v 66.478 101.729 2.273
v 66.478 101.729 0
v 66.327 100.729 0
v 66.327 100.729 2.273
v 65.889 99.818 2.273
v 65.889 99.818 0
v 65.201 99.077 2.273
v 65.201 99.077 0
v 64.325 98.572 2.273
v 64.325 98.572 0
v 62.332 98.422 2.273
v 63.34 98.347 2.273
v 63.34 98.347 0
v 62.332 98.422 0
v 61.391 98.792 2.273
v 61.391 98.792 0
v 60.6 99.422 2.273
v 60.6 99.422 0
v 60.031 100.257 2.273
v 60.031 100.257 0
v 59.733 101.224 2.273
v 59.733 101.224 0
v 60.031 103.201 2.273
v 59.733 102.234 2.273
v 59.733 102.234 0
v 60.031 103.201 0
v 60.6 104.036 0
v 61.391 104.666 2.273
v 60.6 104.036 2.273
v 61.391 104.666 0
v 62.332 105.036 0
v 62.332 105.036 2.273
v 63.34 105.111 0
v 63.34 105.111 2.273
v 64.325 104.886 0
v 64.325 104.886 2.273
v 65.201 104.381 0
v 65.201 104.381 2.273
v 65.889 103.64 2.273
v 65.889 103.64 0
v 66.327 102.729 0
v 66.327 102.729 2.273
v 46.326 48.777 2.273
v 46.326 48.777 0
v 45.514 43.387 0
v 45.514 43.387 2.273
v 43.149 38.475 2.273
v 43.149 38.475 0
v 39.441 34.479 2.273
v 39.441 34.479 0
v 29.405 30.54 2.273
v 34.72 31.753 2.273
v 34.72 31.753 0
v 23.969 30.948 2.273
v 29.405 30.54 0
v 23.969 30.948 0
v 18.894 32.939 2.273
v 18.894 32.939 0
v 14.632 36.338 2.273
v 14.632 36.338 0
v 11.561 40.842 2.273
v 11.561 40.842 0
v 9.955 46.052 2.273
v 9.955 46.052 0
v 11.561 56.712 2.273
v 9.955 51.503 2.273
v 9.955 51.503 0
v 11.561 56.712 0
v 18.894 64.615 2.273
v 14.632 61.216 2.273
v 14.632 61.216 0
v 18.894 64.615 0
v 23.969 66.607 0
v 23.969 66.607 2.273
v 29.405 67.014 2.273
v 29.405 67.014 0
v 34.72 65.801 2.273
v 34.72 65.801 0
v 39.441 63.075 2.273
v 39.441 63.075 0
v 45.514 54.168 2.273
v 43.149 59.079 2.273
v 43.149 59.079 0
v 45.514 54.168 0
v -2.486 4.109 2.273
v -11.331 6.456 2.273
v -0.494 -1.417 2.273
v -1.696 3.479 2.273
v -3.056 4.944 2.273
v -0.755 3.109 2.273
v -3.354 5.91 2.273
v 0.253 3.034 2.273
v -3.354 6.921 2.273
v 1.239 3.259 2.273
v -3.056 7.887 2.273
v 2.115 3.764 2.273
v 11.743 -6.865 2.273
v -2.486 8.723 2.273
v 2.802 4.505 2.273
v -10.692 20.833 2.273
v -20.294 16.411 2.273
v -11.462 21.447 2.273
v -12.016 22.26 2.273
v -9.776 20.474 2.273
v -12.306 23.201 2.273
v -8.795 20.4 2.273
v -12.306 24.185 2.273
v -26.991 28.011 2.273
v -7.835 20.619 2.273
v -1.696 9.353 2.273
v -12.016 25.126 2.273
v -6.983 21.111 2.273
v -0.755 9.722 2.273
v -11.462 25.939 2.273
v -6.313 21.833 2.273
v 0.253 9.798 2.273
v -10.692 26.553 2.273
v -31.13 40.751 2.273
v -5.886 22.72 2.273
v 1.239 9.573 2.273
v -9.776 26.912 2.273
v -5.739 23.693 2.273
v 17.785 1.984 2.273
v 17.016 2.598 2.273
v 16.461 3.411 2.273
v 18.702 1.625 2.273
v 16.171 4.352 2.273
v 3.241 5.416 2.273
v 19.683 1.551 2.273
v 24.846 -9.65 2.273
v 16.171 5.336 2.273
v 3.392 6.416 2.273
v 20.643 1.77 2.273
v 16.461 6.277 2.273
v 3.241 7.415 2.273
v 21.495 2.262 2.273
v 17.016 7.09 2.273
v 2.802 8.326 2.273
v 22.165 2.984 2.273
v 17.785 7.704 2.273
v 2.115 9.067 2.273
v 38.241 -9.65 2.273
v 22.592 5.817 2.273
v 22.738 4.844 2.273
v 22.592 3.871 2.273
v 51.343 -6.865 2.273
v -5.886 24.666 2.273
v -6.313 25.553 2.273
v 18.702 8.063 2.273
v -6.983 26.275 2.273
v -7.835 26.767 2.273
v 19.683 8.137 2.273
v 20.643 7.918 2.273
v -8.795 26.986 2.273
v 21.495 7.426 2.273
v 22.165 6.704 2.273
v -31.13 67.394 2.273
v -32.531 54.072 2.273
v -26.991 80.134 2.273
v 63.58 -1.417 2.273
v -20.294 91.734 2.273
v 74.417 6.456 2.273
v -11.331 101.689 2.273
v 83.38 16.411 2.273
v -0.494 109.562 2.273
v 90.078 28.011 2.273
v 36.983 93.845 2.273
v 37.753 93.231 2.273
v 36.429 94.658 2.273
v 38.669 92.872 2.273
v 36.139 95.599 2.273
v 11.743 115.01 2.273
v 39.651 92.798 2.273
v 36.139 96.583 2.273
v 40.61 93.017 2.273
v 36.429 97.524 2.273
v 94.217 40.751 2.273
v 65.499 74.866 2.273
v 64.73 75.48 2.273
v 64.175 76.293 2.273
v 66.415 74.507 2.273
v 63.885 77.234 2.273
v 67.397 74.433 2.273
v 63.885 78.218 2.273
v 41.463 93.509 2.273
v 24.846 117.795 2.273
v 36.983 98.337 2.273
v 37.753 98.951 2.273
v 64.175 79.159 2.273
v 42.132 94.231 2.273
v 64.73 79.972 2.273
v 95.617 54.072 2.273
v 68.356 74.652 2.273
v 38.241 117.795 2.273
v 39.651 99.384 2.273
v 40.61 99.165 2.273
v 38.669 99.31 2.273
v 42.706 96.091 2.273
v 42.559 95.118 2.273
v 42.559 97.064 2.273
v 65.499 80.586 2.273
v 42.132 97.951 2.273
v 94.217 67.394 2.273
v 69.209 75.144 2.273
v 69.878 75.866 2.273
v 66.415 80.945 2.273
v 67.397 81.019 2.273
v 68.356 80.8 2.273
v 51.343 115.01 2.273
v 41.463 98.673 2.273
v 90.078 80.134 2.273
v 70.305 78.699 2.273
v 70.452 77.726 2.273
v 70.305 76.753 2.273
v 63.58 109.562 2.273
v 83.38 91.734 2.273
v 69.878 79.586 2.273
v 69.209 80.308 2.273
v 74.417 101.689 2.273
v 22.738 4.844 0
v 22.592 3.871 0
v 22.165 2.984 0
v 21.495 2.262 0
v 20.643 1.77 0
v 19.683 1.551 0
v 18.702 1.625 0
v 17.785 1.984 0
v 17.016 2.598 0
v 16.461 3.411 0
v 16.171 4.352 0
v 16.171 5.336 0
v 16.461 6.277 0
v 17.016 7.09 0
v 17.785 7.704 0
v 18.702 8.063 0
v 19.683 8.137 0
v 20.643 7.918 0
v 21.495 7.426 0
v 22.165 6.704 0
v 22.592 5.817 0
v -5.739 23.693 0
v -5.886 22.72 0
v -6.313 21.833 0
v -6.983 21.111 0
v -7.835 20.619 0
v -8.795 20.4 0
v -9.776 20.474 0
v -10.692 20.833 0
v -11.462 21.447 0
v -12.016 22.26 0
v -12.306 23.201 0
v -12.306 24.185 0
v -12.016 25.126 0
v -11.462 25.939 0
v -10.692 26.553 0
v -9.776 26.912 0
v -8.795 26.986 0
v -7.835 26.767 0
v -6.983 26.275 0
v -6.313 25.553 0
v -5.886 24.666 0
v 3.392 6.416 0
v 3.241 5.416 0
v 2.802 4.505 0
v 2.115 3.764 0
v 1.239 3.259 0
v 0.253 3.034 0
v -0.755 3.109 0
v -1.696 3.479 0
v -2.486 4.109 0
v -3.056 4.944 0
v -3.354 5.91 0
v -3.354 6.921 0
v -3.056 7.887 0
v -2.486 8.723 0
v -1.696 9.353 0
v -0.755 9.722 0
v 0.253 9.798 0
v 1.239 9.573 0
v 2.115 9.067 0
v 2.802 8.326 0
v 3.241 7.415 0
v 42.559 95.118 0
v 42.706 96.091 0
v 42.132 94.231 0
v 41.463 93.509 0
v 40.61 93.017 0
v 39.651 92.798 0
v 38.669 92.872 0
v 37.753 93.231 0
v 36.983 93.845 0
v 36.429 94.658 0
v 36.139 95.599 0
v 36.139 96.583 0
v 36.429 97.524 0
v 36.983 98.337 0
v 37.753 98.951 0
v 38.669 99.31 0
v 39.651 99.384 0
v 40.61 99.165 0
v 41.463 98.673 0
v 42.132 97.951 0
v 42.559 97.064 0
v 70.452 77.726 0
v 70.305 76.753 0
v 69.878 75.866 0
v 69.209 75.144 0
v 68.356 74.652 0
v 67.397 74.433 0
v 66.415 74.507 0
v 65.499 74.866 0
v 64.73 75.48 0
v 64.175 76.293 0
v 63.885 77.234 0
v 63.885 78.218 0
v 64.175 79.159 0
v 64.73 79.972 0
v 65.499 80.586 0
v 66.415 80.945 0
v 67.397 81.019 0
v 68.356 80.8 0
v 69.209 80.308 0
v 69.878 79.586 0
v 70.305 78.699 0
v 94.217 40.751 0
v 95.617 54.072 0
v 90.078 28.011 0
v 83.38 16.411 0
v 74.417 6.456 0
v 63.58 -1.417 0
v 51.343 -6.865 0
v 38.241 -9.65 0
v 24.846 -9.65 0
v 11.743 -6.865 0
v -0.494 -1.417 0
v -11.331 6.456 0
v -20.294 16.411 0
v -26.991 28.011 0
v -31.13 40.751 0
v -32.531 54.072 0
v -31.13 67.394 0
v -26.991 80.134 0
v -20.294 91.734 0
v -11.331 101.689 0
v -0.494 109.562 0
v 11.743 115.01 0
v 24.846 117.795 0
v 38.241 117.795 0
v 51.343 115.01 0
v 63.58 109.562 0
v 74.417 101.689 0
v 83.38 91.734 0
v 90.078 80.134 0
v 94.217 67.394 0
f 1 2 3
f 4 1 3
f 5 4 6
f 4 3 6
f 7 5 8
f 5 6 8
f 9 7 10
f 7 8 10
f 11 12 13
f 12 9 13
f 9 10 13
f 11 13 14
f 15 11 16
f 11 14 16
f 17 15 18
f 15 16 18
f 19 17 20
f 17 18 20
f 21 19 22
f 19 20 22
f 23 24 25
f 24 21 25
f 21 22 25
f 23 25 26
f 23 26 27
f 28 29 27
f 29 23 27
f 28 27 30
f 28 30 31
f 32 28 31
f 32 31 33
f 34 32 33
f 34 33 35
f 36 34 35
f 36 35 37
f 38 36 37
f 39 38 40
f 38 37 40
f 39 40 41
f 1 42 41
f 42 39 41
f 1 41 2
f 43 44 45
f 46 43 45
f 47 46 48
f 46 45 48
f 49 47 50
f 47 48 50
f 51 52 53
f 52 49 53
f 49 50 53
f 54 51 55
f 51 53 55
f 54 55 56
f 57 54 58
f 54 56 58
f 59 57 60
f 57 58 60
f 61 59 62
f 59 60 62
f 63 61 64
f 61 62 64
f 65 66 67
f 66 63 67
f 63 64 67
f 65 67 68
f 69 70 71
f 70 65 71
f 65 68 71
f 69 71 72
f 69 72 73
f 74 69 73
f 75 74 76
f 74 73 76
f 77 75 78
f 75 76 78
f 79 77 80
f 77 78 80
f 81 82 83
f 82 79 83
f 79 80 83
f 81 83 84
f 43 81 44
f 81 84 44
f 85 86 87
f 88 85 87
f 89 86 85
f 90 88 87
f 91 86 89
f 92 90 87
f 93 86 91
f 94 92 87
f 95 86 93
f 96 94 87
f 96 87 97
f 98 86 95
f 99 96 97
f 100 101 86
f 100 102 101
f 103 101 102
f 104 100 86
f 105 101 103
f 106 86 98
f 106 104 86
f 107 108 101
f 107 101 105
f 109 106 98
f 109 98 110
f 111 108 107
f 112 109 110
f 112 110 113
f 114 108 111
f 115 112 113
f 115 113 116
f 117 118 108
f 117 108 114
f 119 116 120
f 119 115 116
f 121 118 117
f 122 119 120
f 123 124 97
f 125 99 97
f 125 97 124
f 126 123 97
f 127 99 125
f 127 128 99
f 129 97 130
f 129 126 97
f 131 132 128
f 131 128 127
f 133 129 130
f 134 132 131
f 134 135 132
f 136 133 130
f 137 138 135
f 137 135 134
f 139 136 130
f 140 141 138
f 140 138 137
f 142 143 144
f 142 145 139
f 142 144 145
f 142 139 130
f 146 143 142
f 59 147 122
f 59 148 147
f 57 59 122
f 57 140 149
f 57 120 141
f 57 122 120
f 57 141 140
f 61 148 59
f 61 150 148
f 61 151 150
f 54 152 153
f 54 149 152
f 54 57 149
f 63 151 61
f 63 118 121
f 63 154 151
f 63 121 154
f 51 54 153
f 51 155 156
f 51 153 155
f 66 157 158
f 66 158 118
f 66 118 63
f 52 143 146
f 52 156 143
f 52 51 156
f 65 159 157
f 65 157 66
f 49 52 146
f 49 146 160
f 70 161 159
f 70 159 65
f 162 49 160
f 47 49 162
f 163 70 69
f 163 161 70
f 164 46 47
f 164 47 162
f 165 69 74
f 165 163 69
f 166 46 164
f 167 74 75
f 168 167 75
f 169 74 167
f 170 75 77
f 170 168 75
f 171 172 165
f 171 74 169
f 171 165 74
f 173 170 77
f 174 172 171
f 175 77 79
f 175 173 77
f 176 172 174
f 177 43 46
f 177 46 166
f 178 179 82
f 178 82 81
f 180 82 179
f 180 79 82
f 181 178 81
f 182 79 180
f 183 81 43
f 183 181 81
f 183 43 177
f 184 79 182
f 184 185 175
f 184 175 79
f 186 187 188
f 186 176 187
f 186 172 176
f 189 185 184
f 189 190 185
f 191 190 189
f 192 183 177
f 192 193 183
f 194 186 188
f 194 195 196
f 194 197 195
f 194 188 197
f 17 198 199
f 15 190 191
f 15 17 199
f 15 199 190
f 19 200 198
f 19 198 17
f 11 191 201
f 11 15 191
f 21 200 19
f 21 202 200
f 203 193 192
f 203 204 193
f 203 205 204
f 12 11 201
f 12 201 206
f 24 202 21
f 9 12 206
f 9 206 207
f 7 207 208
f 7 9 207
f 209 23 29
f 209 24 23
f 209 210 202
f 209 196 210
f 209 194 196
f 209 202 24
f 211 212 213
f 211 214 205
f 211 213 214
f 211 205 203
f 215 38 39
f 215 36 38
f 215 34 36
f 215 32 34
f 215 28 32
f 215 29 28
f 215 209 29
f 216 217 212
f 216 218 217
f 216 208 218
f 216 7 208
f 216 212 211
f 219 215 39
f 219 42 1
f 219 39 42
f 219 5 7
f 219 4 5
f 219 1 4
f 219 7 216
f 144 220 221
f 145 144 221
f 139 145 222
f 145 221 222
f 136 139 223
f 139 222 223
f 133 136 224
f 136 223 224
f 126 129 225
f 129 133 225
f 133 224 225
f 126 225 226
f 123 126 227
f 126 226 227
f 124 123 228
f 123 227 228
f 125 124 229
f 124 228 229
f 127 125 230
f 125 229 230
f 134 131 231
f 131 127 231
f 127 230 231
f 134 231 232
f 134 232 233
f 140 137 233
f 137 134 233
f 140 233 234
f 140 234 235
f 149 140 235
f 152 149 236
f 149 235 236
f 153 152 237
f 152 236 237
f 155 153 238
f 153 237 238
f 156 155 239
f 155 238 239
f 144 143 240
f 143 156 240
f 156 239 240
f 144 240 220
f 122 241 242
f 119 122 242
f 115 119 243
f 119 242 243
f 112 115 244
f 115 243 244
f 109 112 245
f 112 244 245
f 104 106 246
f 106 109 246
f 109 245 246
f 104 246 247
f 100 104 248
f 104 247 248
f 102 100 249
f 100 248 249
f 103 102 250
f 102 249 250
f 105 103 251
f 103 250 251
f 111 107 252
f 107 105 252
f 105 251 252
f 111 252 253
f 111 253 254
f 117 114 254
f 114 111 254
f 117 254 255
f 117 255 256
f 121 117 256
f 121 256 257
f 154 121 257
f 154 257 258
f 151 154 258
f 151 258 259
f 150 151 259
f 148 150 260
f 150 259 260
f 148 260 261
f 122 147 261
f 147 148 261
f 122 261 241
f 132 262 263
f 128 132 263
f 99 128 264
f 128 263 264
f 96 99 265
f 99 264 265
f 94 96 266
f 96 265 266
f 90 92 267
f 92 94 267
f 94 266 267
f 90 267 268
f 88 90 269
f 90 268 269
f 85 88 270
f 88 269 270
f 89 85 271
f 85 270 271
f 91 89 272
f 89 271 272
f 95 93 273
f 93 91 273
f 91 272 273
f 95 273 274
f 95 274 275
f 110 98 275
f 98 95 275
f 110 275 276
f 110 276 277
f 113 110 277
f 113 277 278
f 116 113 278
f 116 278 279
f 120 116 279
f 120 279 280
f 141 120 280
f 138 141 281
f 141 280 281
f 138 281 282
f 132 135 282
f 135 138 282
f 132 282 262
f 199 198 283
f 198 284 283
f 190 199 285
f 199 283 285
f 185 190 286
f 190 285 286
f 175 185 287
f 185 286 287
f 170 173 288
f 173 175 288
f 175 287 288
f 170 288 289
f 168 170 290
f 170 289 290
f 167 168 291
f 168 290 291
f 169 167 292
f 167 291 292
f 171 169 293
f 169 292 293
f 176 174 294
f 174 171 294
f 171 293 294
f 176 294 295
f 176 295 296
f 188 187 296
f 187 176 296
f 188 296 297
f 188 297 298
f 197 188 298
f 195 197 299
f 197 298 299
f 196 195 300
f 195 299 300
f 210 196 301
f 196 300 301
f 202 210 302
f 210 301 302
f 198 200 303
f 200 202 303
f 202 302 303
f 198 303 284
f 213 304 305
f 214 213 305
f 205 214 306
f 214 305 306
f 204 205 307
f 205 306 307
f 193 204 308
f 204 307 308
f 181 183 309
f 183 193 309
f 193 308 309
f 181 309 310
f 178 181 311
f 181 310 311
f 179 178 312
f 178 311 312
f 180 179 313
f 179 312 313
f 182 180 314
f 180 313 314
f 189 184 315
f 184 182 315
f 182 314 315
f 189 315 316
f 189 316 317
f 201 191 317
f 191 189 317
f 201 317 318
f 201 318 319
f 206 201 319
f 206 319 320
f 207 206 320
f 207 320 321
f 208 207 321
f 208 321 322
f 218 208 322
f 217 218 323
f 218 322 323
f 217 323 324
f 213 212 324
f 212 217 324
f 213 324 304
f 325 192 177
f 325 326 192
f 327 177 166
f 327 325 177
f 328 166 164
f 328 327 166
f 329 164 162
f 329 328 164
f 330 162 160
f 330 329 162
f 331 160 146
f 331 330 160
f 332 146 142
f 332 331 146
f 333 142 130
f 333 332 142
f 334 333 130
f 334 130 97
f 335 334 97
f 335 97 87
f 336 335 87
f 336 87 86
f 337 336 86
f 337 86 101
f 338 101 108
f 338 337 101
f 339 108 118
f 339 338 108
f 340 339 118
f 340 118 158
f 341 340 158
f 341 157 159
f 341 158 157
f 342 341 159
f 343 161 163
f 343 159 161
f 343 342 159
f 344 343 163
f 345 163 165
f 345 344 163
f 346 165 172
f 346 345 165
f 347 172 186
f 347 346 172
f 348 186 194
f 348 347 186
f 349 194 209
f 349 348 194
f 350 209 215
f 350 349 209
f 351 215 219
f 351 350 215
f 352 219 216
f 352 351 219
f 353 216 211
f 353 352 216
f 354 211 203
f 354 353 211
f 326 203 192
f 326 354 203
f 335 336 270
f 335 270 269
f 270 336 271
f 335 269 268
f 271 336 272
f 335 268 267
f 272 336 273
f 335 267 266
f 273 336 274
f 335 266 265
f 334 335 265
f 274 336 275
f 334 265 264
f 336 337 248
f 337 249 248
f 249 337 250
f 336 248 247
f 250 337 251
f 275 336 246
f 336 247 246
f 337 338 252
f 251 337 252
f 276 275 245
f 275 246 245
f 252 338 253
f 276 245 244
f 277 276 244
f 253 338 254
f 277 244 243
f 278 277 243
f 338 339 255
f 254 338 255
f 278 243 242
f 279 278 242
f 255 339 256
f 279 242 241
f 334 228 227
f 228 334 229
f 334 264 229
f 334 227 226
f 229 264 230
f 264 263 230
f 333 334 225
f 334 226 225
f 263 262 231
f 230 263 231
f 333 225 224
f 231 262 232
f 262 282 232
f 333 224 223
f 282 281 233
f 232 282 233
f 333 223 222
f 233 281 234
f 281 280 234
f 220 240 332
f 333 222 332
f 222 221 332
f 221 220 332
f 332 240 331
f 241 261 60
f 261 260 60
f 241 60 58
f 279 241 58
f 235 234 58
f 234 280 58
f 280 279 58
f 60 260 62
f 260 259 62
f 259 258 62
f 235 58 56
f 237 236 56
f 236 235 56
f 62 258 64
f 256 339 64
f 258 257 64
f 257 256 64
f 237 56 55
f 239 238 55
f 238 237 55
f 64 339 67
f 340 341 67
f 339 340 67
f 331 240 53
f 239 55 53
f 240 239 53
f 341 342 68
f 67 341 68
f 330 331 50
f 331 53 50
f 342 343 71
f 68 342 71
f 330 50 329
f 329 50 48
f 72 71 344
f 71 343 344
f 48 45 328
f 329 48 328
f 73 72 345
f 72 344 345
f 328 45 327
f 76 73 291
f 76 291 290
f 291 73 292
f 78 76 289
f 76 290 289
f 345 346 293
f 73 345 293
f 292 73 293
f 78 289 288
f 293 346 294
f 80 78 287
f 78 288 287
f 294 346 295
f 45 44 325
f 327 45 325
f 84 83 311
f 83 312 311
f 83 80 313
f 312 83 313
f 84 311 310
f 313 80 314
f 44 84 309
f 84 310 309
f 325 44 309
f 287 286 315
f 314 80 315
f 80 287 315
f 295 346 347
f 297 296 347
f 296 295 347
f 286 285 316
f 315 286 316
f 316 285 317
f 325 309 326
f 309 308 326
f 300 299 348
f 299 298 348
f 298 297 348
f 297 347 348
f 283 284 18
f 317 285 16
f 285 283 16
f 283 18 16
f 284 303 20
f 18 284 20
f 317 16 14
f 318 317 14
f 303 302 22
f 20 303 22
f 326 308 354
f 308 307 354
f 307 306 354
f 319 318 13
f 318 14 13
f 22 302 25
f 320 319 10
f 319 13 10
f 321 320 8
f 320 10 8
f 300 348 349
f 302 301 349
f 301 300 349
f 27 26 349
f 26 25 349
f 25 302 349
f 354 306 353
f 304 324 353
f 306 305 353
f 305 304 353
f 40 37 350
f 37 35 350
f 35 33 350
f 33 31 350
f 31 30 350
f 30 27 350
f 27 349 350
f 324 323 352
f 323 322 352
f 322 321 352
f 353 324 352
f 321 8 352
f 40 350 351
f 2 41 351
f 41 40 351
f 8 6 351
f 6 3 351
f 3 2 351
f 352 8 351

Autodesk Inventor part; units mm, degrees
ref_plane "YZ Plane" through (0, 0, 0) normal (1, 0, 0) x (0, 1, 0)
ref_plane "XZ Plane" through (0, 0, 0) normal (0, 1, 0) x (-1, 0, 0)
ref_plane "XY Plane" through (0, 0, 0) normal (0, 0, 1) x (1, 0, 0)
sketch "Sketch1" plane through (0, 0, 0) normal (0, 0, 1) x (1, 0, 0)
  arc A0 (2.7781, 11.2277) -> (-2.7781, 11.2277) centre (0, 6.4158) ccw construction
  arc A1 (-2.7781, 11.2277) -> (-5.5562, 6.4158) centre (0, 6.4158) ccw construction
  arc A2 (-5.5562, 6.4158) -> (-2.7781, 1.604) centre (0, 6.4158) ccw construction
  arc A3 (-2.7781, 1.604) -> (2.7781, 1.604) centre (0, 6.4158) ccw construction
  arc A4 (2.7781, 1.604) -> (5.5562, 6.4158) centre (0, 6.4158) ccw construction
  arc A5 (5.5562, 6.4158) -> (2.7781, 11.2277) centre (0, 6.4158) ccw construction
  circle A6 centre (0, 6.4158) radius 3.1376 construction
  arc A7 (65.8645, 106.5408) -> (60.3083, 106.5408) centre (63.0864, 101.729) ccw construction
  arc A8 (60.3083, 106.5408) -> (57.5301, 101.729) centre (63.0864, 101.729) ccw construction
  arc A9 (57.5301, 101.729) -> (60.3083, 96.9171) centre (63.0864, 101.729) ccw construction
  arc A10 (60.3083, 96.9171) -> (65.8645, 96.9171) centre (63.0864, 101.729) ccw construction
  arc A11 (65.8645, 96.9171) -> (68.6426, 101.729) centre (63.0864, 101.729) ccw construction
  arc A12 (68.6426, 101.729) -> (65.8645, 106.5408) centre (63.0864, 101.729) ccw construction
  circle A13 centre (63.0864, 101.729) radius 3.1376 construction
  circle A14 centre (28.0384, 48.7772) radius 16.383 construction
  circle A15 centre (28.0384, 48.7772) radius 18.288
  circle A16 centre (0, 6.4158) radius 6.4158 construction
  circle A17 centre (63.0864, 101.729) radius 6.4158 construction
  circle A18 centre (63.0864, 101.729) radius 6.9238 construction
  circle A19 centre (0, 6.4158) radius 6.9238 construction
  circle A20 centre (0, 6.4158) radius 3.3916
  circle A21 centre (63.0864, 101.729) radius 3.3916
  circle A22 centre (28.0384, 48.7772) radius 38.1 construction
  line L0 (66.9079, 107.5026) -> (-3.8215, 0.6421) construction
  ellipse E0 centre (31.5432, 54.0724) end of major axis (-3.8215, 0.6421) minor radius 35.9584 construction
  circle A23 centre (67.1501, 77.726) radius 3.302
  circle A24 centre (39.4038, 96.091) radius 3.302
  circle A25 centre (19.4364, 4.8439) radius 3.302
  circle A26 centre (-9.0413, 23.6929) radius 3.302
  line L1 (67.1501, 77.726) -> (53.277, 86.9085) construction
  line L2 (39.4038, 96.091) -> (53.277, 86.9085) construction
  line L3 (19.4364, 4.8439) -> (5.1975, 14.2684) construction
  line L4 (-9.0413, 23.6929) -> (5.1975, 14.2684) construction
  circle A27 centre (67.1501, 77.726) radius 10.5597 construction
  circle A28 centre (19.4364, 4.8439) radius 5.715 construction
  circle A29 centre (0, 6.4158) radius 13.7848 construction
  circle A30 centre (63.0864, 101.729) radius 13.7848 construction
  circle A31 centre (19.4364, 4.8439) radius 6.6675 construction
  circle A32 centre (31.5432, 54.0724) radius 64.0738
  point P0 (0, 0)
  point P1 (63.0864, 95.3131)
  point P2 (63.0864, 87.9441)
  point P3 (0, 20.2006)
  dimension "d3" = 0.508
  dimension "d4" = 0.508
  dimension "d0" = 1.905
  dimension "d1" = 0.254
  dimension "d2" = 0.254
  dimension "d6" = 6.604
  dimension "d7" = 6.604
  dimension "d8" = 6.604
  dimension "d9" = 6.604
  dimension "d12" = 11.43
  dimension "d13" = 13.335
extrude "Extrusion1" add sketch "Sketch1" along normal blind 2.2733
equation "\"d2\" = d1"
equation "\"d7\" = d6"
equation "\"d8\" = d6"
equation "\"d9\" = d6"
equation "\"BendRadius\" = Thickness"
equation "\"BendReliefWidth\" = Thickness"
equation "\"BendReliefDepth\" = 0.5 * Thickness"
equation "\"CornerReliefSize\" = 4 * Thickness"
equation "\"MinimumRemnant\" = 2 * Thickness"
equation "\"TransitionRadius\" = BendRadius"
equation "\"JacobiRadiusSize\" = Thickness"
equation "\"GapSize\" = Thickness"
equation "\"Thickness\" = 2.286"
properties part number "Bottom Hub Plate" material "Aluminum"
